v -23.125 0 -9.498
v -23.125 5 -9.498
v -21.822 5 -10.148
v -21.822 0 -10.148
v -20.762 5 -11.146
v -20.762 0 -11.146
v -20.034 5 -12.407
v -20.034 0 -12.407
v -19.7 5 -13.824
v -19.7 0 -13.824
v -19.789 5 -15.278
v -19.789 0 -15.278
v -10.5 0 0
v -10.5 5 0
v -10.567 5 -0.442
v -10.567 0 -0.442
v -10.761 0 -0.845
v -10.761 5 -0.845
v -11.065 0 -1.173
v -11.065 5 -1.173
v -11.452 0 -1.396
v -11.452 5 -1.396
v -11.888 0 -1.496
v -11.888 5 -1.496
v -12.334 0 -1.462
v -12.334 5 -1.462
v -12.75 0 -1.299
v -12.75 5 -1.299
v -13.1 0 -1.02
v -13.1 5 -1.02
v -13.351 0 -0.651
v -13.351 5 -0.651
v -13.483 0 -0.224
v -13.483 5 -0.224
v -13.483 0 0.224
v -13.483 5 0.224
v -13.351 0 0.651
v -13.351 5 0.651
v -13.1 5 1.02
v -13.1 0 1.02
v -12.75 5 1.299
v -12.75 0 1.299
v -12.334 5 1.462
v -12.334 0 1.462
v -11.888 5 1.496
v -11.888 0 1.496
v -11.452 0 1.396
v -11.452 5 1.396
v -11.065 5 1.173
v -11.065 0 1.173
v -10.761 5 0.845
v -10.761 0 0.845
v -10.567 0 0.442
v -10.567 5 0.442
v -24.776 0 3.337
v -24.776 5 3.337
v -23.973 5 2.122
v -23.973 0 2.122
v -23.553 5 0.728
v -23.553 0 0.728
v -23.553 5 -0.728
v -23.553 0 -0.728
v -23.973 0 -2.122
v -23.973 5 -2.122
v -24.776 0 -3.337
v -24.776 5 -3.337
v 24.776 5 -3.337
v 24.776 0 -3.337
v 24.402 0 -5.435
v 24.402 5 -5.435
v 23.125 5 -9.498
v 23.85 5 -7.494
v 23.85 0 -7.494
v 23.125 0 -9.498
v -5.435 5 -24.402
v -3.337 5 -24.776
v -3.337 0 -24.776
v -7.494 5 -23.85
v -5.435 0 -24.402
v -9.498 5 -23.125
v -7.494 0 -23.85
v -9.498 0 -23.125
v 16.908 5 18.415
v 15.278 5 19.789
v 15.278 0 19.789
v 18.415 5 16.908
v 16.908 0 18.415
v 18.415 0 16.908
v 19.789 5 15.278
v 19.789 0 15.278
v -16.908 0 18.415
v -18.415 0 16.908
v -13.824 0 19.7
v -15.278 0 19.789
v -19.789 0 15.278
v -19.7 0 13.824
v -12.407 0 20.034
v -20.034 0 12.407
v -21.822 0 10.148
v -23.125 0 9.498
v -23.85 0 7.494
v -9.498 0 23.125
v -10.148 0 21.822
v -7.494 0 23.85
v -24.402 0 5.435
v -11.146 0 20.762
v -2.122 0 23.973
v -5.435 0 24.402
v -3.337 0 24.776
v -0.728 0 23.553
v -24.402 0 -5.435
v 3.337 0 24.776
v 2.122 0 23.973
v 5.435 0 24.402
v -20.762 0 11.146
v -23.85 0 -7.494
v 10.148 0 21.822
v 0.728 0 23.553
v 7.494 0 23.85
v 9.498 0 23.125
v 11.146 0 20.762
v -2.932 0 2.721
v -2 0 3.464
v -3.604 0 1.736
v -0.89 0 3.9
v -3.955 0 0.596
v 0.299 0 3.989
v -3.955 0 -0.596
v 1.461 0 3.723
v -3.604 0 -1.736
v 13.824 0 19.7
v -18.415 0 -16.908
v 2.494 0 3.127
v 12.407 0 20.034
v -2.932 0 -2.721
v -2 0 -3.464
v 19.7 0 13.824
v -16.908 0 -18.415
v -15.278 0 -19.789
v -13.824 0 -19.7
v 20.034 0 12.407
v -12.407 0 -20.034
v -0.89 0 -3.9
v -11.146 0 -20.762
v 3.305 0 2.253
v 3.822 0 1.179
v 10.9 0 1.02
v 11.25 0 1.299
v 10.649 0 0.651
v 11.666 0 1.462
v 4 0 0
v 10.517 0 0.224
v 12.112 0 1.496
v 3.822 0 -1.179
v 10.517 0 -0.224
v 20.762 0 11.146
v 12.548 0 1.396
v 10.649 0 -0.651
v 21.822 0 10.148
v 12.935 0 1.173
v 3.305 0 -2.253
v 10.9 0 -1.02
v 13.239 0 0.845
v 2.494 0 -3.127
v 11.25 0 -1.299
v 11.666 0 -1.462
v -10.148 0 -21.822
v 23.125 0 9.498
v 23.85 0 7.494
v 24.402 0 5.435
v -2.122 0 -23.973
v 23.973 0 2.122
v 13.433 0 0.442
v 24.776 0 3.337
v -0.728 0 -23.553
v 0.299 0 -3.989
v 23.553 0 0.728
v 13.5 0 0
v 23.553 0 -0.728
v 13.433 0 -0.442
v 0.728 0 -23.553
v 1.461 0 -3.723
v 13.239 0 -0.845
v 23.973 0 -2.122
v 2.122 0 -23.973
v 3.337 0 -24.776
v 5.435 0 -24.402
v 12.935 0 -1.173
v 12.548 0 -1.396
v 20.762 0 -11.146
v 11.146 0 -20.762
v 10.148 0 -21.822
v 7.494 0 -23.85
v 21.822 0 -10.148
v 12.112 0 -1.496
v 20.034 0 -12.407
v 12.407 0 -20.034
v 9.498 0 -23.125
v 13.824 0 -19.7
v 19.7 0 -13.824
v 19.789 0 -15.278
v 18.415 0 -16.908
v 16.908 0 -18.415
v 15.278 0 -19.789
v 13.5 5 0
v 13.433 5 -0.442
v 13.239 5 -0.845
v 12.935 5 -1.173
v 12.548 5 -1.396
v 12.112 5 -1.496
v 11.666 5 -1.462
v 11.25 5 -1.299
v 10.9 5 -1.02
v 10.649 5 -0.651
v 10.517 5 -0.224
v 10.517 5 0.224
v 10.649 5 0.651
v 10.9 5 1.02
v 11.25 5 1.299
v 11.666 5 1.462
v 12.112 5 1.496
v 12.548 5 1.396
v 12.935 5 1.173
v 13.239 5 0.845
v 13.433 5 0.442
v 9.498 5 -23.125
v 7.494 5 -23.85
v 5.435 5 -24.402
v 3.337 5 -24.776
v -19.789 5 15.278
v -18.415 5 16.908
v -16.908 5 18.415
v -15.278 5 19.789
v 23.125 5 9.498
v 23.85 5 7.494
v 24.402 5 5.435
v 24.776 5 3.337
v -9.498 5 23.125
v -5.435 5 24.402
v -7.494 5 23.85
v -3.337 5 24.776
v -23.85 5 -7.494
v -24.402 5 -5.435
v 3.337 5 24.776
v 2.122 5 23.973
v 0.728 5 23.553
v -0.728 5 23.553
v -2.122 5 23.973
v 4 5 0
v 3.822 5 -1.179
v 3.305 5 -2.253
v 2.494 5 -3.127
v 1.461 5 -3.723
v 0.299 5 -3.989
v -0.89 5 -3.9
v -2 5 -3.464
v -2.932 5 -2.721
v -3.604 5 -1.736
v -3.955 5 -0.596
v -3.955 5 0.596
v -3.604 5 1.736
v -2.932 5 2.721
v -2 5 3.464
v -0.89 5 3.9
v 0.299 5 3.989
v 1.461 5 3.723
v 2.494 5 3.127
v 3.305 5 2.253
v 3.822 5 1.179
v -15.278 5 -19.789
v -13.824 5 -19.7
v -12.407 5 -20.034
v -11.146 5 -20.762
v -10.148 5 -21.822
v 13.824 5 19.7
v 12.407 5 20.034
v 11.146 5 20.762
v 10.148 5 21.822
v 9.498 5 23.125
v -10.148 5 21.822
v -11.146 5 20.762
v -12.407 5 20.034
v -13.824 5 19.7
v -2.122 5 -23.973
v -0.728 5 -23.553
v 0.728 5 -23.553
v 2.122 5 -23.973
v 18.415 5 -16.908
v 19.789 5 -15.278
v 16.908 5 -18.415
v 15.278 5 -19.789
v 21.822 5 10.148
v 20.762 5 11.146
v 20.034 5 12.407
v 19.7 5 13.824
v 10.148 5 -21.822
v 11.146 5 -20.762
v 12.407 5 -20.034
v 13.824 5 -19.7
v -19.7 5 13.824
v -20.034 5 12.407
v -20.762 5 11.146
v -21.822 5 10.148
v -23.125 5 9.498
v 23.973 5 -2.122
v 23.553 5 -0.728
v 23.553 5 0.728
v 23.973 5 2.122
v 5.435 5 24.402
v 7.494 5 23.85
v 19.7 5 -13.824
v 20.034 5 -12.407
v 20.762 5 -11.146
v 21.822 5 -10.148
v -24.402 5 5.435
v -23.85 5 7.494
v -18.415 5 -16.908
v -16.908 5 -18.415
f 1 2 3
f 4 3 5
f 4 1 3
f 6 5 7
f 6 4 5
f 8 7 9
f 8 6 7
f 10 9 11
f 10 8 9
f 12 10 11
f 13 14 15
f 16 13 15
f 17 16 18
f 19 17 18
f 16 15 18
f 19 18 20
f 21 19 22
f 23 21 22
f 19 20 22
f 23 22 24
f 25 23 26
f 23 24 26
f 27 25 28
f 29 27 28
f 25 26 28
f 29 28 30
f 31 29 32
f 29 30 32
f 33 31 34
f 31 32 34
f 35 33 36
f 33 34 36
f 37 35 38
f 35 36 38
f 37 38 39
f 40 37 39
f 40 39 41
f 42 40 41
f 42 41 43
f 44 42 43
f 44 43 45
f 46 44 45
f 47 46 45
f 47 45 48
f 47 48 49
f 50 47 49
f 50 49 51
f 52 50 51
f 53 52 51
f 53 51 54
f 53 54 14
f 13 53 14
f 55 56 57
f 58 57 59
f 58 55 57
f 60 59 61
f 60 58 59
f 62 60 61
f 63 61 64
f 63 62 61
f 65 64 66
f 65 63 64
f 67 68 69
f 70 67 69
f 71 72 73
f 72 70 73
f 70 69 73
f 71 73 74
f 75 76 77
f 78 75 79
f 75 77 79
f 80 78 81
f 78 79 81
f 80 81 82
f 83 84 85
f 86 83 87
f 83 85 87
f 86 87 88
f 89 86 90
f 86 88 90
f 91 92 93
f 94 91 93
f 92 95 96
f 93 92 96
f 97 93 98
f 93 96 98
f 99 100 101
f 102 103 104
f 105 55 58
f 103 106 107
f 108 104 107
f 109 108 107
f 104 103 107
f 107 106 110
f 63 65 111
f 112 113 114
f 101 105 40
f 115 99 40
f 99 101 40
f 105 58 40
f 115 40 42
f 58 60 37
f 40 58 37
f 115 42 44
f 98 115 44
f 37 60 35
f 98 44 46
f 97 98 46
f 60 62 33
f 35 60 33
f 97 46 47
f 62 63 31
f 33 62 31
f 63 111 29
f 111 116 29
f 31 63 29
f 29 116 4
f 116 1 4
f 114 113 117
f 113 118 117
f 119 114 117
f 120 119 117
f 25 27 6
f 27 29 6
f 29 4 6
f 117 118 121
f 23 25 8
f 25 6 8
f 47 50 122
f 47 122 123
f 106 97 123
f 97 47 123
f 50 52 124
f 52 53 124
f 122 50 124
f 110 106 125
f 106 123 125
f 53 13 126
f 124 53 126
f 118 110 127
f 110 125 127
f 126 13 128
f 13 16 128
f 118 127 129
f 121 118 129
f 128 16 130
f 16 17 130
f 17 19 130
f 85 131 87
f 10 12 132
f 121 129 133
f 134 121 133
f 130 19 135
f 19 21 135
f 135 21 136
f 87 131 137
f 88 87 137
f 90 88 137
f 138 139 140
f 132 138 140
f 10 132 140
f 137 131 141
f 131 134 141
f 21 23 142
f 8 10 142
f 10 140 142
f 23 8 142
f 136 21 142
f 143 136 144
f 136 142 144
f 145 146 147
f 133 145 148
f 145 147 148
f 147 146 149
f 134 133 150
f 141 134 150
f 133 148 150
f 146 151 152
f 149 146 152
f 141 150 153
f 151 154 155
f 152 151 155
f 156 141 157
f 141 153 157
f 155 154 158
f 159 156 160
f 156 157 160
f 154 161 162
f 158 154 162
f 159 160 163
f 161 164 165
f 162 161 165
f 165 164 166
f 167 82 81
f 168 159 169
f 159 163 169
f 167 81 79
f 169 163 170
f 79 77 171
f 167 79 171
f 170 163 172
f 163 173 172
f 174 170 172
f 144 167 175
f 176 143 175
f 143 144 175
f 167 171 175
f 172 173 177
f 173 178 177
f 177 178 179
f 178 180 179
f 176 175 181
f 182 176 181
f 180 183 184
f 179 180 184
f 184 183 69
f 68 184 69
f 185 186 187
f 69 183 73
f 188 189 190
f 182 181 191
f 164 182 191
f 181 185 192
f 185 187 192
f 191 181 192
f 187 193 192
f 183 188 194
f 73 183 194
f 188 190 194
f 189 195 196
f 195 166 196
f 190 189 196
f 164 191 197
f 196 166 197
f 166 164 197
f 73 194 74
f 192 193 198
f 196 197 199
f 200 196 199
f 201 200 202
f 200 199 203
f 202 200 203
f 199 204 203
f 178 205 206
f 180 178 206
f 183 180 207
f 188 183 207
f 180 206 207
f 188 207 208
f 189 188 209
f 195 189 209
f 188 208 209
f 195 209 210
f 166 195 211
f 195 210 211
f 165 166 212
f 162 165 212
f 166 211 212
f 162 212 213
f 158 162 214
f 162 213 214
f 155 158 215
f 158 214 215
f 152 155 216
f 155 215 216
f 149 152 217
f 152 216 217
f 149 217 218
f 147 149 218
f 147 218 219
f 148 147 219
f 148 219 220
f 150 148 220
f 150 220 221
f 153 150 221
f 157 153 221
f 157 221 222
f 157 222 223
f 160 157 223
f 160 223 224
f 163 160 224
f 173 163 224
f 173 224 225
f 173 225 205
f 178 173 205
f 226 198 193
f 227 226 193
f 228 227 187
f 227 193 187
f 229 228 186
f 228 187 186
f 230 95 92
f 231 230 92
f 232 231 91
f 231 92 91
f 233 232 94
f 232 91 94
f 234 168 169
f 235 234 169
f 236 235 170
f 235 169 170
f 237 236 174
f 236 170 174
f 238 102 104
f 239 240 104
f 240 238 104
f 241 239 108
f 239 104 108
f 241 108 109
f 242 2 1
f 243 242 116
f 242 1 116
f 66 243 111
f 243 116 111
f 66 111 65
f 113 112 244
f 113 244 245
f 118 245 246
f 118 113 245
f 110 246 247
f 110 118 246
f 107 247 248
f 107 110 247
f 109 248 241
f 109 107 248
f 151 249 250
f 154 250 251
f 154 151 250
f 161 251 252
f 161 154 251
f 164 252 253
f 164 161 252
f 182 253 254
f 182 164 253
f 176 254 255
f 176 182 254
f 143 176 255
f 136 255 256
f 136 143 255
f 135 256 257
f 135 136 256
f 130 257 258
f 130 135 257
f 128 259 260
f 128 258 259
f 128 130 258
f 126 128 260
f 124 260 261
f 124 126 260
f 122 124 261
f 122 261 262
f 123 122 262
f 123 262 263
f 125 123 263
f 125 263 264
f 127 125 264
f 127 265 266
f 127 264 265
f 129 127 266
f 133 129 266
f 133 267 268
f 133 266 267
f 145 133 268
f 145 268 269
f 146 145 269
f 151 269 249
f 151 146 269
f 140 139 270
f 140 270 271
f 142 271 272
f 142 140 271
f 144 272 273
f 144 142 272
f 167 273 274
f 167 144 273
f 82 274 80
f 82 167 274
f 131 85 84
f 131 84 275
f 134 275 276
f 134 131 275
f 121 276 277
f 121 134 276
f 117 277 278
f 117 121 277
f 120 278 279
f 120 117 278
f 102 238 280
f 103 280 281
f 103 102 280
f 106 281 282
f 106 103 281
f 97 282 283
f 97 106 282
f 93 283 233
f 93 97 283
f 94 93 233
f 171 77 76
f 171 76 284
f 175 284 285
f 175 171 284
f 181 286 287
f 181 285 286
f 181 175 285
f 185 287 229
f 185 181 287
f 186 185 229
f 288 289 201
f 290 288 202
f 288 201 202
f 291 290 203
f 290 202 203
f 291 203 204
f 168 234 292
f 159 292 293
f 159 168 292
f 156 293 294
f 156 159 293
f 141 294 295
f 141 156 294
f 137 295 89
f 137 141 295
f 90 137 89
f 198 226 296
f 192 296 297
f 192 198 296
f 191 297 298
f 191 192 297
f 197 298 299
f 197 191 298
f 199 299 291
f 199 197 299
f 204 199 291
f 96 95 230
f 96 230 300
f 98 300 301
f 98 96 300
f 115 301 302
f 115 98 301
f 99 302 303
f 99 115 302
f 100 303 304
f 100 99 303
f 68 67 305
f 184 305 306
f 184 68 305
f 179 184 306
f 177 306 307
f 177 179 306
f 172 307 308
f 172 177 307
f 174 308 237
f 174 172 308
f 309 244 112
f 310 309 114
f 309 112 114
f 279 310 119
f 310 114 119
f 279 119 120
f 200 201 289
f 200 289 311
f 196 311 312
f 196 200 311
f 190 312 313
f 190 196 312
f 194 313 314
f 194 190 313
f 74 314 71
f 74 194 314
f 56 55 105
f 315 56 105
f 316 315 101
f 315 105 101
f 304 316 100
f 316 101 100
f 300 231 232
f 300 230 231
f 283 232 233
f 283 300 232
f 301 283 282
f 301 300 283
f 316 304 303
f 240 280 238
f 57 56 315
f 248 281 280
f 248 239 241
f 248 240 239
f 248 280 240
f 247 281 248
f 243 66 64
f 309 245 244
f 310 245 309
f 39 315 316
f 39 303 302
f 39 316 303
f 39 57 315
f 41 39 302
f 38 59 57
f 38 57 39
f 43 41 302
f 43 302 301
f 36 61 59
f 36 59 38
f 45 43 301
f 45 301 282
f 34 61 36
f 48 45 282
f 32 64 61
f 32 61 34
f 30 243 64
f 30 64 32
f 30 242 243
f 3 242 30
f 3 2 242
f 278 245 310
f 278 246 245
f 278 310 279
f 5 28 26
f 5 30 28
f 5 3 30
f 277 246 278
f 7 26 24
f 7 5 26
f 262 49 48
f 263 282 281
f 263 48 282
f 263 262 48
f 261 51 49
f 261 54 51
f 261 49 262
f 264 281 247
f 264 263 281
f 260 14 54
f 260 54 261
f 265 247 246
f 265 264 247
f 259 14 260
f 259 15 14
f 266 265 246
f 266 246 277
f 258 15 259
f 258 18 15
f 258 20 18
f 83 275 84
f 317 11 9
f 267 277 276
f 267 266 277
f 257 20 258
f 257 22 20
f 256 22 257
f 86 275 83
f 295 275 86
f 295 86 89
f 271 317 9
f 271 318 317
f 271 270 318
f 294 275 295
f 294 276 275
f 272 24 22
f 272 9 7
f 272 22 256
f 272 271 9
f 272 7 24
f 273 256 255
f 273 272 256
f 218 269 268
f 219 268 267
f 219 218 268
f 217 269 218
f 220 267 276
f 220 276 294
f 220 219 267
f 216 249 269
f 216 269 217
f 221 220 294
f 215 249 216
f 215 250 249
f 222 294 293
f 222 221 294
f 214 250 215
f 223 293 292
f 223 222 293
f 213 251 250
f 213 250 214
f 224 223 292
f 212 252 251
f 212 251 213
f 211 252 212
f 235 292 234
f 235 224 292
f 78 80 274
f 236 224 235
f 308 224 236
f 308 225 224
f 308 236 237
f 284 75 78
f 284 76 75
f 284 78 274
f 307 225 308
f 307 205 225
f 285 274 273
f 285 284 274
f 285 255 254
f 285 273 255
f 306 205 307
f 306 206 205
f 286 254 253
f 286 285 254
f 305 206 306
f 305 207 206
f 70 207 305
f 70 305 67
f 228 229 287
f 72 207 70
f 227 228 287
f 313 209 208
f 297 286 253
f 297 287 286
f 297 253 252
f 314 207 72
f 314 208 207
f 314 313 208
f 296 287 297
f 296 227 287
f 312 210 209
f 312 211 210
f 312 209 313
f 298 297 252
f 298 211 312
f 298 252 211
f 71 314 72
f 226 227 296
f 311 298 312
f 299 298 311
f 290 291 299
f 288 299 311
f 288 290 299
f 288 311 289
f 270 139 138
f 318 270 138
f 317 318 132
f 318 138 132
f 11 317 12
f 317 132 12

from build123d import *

# Parameters (mm, degrees)
SKETCH1_R           = 25
BOSS_EXTRUDE1_DEPTH = 5
SKETCH2_R           = 5
CUT_EXTRUDE1_DEPTH  = 6
CIRPATTERN1_COUNT   = 12
SKETCH3_R           = 4
CUT_EXTRUDE2_DEPTH  = 6
SKETCH4_R           = 1.5
CUT_EXTRUDE3_DEPTH  = 6


with BuildPart() as part:
    # Sketch1 → Boss-Extrude1 (new body)
    with BuildSketch(Plane(origin=(0, 0, 0), x_dir=(1, 0, 0), z_dir=(0, 1, 0))):
        Circle(SKETCH1_R)
    extrude(amount=BOSS_EXTRUDE1_DEPTH)

    # Sketch2 → Cut-Extrude1 (cut, through all)
    with BuildSketch(Plane(origin=(0, 0, 0), x_dir=(1, 0, 0), z_dir=(0, 1, 0))):
        with Locations((0, 28.5)):
            Circle(SKETCH2_R)
    cut_extrude1 = extrude(amount=CUT_EXTRUDE1_DEPTH, mode=Mode.SUBTRACT)

    # CirPattern1: Cut-Extrude1 ×12 about axis
    cirpattern1_axis = Axis((0, 0, 0), (0, 1, 0))
    for i in range(1, CIRPATTERN1_COUNT):
        add(cut_extrude1.rotate(cirpattern1_axis, i * 360 / CIRPATTERN1_COUNT), mode=Mode.SUBTRACT)

    # Sketch3 → Cut-Extrude2 (cut, through all)
    with BuildSketch(Plane(origin=(0, 0, 0), x_dir=(1, 0, 0), z_dir=(0, 1, 0))):
        Circle(SKETCH3_R)
    extrude(amount=CUT_EXTRUDE2_DEPTH, mode=Mode.SUBTRACT)

    # Sketch4 → Cut-Extrude3 (cut, through all)
    with BuildSketch(Plane(origin=(0, 5, 0), x_dir=(1, 0, 0), z_dir=(0, 1, 0))):
        with Locations((-12, 0)):
            Circle(SKETCH4_R)
        with Locations((12, 0)):
            Circle(SKETCH4_R)
    extrude(amount=-CUT_EXTRUDE3_DEPTH, mode=Mode.SUBTRACT)


solid = part.part
